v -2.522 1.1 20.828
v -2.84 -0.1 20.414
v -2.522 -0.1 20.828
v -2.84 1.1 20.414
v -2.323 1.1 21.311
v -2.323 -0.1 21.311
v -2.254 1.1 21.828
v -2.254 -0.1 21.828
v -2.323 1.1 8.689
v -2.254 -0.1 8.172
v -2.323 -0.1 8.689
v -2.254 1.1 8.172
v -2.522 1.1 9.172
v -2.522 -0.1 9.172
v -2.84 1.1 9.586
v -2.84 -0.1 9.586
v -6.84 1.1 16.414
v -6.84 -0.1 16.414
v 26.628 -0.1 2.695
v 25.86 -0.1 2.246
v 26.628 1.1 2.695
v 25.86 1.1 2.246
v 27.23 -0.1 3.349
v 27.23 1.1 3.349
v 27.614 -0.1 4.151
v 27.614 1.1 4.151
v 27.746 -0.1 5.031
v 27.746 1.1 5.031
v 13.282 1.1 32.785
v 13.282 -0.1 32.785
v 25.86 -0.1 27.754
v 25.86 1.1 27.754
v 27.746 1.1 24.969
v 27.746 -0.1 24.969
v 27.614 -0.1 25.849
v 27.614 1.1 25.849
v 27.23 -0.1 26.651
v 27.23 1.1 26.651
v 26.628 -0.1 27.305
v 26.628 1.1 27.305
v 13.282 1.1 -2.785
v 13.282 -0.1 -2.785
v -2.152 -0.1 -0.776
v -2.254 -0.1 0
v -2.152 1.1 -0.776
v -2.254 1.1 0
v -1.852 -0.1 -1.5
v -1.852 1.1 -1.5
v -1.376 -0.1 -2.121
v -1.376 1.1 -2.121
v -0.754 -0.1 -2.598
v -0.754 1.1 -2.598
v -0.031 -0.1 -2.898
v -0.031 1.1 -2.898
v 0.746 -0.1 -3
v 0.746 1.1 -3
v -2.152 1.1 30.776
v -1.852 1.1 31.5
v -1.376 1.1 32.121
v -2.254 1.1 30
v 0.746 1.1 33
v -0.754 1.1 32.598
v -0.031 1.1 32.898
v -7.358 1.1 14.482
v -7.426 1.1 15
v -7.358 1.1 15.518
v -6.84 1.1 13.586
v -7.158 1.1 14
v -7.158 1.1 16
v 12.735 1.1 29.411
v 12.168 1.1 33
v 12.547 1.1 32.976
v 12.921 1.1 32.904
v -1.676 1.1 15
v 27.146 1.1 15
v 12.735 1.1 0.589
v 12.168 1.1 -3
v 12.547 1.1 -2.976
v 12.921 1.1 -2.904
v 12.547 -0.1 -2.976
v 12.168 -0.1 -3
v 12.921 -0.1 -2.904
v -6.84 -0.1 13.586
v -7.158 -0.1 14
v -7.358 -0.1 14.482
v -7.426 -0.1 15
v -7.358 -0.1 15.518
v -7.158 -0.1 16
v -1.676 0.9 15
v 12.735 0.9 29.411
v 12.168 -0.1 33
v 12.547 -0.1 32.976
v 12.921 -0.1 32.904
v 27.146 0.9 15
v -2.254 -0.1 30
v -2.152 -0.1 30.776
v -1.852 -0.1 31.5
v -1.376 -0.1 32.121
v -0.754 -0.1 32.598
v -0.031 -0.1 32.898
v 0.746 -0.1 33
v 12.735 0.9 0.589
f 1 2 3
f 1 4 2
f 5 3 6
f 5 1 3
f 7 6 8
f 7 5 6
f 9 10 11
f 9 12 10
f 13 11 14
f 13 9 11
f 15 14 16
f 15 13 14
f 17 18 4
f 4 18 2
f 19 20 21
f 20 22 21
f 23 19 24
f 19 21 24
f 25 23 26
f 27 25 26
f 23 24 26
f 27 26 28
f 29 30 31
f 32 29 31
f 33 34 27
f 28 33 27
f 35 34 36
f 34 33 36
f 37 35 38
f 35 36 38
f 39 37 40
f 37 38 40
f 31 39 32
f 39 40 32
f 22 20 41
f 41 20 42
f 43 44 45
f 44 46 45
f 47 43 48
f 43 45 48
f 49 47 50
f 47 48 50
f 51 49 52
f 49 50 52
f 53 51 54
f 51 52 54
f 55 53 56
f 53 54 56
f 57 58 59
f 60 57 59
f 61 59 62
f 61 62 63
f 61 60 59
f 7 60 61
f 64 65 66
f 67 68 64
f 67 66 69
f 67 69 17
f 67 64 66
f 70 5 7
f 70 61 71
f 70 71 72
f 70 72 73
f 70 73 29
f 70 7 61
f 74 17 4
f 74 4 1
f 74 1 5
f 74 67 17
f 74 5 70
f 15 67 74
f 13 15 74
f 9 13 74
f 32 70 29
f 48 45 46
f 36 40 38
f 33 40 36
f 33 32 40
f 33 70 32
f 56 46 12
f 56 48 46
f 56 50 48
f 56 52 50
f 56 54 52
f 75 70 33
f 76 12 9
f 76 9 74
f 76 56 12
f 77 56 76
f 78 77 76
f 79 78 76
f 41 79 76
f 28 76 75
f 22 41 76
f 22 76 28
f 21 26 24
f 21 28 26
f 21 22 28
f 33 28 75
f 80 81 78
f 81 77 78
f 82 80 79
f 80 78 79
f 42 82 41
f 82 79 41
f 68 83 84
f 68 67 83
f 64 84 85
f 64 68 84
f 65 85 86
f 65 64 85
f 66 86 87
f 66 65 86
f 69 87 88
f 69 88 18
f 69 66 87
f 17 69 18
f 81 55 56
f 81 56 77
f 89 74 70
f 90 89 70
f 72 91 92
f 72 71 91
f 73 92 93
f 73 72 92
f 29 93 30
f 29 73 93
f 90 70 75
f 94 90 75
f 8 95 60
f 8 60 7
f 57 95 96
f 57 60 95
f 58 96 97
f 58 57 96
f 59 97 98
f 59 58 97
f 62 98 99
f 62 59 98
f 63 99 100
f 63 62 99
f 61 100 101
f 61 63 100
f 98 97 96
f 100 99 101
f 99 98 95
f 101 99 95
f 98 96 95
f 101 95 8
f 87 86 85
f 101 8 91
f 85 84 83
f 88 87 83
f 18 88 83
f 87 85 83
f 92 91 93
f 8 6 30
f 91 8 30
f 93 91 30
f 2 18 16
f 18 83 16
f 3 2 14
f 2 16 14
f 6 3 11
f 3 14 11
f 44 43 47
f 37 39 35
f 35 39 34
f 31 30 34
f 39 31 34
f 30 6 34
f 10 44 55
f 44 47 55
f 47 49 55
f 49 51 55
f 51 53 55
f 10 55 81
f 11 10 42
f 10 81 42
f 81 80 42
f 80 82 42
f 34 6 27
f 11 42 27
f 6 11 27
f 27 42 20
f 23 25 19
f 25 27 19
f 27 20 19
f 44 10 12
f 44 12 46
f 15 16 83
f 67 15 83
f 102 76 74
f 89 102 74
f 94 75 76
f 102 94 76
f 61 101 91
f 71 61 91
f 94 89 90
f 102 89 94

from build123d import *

# Parameters (mm, degrees)
SKETCH_1_W          = 12.5
SKETCH_1_H          = 30
EXTRUDE_1_DEPTH     = 1
SCALE_1_SCALE       = 1.2
FILLET_1_R          = 2
FILLET_2_R          = 3
FILLET_3_R          = 2
CUT_EXTRUDE_1_DEPTH = 0.2


with BuildPart() as part:
    # 草图1 → 凸台-拉伸1 (new body)
    with BuildSketch(Plane(origin=(0, 0, 0), x_dir=(1, 0, 0), z_dir=(0, 1, 0))):
        with Locations((6.25, -15)):
            Rectangle(SKETCH_1_W, SKETCH_1_H)
        Polygon((25, -5), (12.5, 0), (12.5, -30), (25, -25), align=None)
        Polygon((0, -15), (0, -10), (-5, -15), align=None)
        Polygon((0, -20), (0, -15), (-5, -15), align=None)
    extrude(amount=EXTRUDE_1_DEPTH)


with BuildPart() as part_1:
    # 缩放比例1: scaled about (11.271929825, 0.5, 15)
    add(part.part.scale(SCALE_1_SCALE).moved(Location((-2.254385965, -0.1, -3))))

    # 圆角1
    fillet_1_edges = [part_1.edges().sort_by_distance(p)[0] for p in [
        (-8.254385965, 0.5, 15),
    ]]
    fillet(fillet_1_edges, radius=FILLET_1_R)

    # 圆角2
    fillet_2_edges = [part_1.edges().sort_by_distance(p)[0] for p in [
        (-2.254385965, 0.5, -3),
        (12.745614035, 0.5, -3),
        (27.745614035, 0.5, 3),
        (27.745614035, 0.5, 27),
        (12.745614035, 0.5, 33),
        (-2.254385965, 0.5, 33),
    ]]
    fillet(fillet_2_edges, radius=FILLET_2_R)

    # 圆角3
    fillet_3_edges = [part_1.edges().sort_by_distance(p)[0] for p in [
        (-2.254385965, 0.5, 9),
        (-2.254385965, 0.5, 21),
    ]]
    fillet(fillet_3_edges, radius=FILLET_3_R)

    # 草图2 → 切除-拉伸1 (cut)
    with BuildSketch(Plane(origin=(0, 1.1, 0), x_dir=(1, 0, 0), z_dir=(0, 1, 0))):
        Polygon((27.146025588, -15), (12.735189388, -0.589163799), (-1.675646813, -15), (12.735189388, -29.410836201), align=None)
    extrude(amount=-CUT_EXTRUDE_1_DEPTH, mode=Mode.SUBTRACT)


solid = part_1.part
